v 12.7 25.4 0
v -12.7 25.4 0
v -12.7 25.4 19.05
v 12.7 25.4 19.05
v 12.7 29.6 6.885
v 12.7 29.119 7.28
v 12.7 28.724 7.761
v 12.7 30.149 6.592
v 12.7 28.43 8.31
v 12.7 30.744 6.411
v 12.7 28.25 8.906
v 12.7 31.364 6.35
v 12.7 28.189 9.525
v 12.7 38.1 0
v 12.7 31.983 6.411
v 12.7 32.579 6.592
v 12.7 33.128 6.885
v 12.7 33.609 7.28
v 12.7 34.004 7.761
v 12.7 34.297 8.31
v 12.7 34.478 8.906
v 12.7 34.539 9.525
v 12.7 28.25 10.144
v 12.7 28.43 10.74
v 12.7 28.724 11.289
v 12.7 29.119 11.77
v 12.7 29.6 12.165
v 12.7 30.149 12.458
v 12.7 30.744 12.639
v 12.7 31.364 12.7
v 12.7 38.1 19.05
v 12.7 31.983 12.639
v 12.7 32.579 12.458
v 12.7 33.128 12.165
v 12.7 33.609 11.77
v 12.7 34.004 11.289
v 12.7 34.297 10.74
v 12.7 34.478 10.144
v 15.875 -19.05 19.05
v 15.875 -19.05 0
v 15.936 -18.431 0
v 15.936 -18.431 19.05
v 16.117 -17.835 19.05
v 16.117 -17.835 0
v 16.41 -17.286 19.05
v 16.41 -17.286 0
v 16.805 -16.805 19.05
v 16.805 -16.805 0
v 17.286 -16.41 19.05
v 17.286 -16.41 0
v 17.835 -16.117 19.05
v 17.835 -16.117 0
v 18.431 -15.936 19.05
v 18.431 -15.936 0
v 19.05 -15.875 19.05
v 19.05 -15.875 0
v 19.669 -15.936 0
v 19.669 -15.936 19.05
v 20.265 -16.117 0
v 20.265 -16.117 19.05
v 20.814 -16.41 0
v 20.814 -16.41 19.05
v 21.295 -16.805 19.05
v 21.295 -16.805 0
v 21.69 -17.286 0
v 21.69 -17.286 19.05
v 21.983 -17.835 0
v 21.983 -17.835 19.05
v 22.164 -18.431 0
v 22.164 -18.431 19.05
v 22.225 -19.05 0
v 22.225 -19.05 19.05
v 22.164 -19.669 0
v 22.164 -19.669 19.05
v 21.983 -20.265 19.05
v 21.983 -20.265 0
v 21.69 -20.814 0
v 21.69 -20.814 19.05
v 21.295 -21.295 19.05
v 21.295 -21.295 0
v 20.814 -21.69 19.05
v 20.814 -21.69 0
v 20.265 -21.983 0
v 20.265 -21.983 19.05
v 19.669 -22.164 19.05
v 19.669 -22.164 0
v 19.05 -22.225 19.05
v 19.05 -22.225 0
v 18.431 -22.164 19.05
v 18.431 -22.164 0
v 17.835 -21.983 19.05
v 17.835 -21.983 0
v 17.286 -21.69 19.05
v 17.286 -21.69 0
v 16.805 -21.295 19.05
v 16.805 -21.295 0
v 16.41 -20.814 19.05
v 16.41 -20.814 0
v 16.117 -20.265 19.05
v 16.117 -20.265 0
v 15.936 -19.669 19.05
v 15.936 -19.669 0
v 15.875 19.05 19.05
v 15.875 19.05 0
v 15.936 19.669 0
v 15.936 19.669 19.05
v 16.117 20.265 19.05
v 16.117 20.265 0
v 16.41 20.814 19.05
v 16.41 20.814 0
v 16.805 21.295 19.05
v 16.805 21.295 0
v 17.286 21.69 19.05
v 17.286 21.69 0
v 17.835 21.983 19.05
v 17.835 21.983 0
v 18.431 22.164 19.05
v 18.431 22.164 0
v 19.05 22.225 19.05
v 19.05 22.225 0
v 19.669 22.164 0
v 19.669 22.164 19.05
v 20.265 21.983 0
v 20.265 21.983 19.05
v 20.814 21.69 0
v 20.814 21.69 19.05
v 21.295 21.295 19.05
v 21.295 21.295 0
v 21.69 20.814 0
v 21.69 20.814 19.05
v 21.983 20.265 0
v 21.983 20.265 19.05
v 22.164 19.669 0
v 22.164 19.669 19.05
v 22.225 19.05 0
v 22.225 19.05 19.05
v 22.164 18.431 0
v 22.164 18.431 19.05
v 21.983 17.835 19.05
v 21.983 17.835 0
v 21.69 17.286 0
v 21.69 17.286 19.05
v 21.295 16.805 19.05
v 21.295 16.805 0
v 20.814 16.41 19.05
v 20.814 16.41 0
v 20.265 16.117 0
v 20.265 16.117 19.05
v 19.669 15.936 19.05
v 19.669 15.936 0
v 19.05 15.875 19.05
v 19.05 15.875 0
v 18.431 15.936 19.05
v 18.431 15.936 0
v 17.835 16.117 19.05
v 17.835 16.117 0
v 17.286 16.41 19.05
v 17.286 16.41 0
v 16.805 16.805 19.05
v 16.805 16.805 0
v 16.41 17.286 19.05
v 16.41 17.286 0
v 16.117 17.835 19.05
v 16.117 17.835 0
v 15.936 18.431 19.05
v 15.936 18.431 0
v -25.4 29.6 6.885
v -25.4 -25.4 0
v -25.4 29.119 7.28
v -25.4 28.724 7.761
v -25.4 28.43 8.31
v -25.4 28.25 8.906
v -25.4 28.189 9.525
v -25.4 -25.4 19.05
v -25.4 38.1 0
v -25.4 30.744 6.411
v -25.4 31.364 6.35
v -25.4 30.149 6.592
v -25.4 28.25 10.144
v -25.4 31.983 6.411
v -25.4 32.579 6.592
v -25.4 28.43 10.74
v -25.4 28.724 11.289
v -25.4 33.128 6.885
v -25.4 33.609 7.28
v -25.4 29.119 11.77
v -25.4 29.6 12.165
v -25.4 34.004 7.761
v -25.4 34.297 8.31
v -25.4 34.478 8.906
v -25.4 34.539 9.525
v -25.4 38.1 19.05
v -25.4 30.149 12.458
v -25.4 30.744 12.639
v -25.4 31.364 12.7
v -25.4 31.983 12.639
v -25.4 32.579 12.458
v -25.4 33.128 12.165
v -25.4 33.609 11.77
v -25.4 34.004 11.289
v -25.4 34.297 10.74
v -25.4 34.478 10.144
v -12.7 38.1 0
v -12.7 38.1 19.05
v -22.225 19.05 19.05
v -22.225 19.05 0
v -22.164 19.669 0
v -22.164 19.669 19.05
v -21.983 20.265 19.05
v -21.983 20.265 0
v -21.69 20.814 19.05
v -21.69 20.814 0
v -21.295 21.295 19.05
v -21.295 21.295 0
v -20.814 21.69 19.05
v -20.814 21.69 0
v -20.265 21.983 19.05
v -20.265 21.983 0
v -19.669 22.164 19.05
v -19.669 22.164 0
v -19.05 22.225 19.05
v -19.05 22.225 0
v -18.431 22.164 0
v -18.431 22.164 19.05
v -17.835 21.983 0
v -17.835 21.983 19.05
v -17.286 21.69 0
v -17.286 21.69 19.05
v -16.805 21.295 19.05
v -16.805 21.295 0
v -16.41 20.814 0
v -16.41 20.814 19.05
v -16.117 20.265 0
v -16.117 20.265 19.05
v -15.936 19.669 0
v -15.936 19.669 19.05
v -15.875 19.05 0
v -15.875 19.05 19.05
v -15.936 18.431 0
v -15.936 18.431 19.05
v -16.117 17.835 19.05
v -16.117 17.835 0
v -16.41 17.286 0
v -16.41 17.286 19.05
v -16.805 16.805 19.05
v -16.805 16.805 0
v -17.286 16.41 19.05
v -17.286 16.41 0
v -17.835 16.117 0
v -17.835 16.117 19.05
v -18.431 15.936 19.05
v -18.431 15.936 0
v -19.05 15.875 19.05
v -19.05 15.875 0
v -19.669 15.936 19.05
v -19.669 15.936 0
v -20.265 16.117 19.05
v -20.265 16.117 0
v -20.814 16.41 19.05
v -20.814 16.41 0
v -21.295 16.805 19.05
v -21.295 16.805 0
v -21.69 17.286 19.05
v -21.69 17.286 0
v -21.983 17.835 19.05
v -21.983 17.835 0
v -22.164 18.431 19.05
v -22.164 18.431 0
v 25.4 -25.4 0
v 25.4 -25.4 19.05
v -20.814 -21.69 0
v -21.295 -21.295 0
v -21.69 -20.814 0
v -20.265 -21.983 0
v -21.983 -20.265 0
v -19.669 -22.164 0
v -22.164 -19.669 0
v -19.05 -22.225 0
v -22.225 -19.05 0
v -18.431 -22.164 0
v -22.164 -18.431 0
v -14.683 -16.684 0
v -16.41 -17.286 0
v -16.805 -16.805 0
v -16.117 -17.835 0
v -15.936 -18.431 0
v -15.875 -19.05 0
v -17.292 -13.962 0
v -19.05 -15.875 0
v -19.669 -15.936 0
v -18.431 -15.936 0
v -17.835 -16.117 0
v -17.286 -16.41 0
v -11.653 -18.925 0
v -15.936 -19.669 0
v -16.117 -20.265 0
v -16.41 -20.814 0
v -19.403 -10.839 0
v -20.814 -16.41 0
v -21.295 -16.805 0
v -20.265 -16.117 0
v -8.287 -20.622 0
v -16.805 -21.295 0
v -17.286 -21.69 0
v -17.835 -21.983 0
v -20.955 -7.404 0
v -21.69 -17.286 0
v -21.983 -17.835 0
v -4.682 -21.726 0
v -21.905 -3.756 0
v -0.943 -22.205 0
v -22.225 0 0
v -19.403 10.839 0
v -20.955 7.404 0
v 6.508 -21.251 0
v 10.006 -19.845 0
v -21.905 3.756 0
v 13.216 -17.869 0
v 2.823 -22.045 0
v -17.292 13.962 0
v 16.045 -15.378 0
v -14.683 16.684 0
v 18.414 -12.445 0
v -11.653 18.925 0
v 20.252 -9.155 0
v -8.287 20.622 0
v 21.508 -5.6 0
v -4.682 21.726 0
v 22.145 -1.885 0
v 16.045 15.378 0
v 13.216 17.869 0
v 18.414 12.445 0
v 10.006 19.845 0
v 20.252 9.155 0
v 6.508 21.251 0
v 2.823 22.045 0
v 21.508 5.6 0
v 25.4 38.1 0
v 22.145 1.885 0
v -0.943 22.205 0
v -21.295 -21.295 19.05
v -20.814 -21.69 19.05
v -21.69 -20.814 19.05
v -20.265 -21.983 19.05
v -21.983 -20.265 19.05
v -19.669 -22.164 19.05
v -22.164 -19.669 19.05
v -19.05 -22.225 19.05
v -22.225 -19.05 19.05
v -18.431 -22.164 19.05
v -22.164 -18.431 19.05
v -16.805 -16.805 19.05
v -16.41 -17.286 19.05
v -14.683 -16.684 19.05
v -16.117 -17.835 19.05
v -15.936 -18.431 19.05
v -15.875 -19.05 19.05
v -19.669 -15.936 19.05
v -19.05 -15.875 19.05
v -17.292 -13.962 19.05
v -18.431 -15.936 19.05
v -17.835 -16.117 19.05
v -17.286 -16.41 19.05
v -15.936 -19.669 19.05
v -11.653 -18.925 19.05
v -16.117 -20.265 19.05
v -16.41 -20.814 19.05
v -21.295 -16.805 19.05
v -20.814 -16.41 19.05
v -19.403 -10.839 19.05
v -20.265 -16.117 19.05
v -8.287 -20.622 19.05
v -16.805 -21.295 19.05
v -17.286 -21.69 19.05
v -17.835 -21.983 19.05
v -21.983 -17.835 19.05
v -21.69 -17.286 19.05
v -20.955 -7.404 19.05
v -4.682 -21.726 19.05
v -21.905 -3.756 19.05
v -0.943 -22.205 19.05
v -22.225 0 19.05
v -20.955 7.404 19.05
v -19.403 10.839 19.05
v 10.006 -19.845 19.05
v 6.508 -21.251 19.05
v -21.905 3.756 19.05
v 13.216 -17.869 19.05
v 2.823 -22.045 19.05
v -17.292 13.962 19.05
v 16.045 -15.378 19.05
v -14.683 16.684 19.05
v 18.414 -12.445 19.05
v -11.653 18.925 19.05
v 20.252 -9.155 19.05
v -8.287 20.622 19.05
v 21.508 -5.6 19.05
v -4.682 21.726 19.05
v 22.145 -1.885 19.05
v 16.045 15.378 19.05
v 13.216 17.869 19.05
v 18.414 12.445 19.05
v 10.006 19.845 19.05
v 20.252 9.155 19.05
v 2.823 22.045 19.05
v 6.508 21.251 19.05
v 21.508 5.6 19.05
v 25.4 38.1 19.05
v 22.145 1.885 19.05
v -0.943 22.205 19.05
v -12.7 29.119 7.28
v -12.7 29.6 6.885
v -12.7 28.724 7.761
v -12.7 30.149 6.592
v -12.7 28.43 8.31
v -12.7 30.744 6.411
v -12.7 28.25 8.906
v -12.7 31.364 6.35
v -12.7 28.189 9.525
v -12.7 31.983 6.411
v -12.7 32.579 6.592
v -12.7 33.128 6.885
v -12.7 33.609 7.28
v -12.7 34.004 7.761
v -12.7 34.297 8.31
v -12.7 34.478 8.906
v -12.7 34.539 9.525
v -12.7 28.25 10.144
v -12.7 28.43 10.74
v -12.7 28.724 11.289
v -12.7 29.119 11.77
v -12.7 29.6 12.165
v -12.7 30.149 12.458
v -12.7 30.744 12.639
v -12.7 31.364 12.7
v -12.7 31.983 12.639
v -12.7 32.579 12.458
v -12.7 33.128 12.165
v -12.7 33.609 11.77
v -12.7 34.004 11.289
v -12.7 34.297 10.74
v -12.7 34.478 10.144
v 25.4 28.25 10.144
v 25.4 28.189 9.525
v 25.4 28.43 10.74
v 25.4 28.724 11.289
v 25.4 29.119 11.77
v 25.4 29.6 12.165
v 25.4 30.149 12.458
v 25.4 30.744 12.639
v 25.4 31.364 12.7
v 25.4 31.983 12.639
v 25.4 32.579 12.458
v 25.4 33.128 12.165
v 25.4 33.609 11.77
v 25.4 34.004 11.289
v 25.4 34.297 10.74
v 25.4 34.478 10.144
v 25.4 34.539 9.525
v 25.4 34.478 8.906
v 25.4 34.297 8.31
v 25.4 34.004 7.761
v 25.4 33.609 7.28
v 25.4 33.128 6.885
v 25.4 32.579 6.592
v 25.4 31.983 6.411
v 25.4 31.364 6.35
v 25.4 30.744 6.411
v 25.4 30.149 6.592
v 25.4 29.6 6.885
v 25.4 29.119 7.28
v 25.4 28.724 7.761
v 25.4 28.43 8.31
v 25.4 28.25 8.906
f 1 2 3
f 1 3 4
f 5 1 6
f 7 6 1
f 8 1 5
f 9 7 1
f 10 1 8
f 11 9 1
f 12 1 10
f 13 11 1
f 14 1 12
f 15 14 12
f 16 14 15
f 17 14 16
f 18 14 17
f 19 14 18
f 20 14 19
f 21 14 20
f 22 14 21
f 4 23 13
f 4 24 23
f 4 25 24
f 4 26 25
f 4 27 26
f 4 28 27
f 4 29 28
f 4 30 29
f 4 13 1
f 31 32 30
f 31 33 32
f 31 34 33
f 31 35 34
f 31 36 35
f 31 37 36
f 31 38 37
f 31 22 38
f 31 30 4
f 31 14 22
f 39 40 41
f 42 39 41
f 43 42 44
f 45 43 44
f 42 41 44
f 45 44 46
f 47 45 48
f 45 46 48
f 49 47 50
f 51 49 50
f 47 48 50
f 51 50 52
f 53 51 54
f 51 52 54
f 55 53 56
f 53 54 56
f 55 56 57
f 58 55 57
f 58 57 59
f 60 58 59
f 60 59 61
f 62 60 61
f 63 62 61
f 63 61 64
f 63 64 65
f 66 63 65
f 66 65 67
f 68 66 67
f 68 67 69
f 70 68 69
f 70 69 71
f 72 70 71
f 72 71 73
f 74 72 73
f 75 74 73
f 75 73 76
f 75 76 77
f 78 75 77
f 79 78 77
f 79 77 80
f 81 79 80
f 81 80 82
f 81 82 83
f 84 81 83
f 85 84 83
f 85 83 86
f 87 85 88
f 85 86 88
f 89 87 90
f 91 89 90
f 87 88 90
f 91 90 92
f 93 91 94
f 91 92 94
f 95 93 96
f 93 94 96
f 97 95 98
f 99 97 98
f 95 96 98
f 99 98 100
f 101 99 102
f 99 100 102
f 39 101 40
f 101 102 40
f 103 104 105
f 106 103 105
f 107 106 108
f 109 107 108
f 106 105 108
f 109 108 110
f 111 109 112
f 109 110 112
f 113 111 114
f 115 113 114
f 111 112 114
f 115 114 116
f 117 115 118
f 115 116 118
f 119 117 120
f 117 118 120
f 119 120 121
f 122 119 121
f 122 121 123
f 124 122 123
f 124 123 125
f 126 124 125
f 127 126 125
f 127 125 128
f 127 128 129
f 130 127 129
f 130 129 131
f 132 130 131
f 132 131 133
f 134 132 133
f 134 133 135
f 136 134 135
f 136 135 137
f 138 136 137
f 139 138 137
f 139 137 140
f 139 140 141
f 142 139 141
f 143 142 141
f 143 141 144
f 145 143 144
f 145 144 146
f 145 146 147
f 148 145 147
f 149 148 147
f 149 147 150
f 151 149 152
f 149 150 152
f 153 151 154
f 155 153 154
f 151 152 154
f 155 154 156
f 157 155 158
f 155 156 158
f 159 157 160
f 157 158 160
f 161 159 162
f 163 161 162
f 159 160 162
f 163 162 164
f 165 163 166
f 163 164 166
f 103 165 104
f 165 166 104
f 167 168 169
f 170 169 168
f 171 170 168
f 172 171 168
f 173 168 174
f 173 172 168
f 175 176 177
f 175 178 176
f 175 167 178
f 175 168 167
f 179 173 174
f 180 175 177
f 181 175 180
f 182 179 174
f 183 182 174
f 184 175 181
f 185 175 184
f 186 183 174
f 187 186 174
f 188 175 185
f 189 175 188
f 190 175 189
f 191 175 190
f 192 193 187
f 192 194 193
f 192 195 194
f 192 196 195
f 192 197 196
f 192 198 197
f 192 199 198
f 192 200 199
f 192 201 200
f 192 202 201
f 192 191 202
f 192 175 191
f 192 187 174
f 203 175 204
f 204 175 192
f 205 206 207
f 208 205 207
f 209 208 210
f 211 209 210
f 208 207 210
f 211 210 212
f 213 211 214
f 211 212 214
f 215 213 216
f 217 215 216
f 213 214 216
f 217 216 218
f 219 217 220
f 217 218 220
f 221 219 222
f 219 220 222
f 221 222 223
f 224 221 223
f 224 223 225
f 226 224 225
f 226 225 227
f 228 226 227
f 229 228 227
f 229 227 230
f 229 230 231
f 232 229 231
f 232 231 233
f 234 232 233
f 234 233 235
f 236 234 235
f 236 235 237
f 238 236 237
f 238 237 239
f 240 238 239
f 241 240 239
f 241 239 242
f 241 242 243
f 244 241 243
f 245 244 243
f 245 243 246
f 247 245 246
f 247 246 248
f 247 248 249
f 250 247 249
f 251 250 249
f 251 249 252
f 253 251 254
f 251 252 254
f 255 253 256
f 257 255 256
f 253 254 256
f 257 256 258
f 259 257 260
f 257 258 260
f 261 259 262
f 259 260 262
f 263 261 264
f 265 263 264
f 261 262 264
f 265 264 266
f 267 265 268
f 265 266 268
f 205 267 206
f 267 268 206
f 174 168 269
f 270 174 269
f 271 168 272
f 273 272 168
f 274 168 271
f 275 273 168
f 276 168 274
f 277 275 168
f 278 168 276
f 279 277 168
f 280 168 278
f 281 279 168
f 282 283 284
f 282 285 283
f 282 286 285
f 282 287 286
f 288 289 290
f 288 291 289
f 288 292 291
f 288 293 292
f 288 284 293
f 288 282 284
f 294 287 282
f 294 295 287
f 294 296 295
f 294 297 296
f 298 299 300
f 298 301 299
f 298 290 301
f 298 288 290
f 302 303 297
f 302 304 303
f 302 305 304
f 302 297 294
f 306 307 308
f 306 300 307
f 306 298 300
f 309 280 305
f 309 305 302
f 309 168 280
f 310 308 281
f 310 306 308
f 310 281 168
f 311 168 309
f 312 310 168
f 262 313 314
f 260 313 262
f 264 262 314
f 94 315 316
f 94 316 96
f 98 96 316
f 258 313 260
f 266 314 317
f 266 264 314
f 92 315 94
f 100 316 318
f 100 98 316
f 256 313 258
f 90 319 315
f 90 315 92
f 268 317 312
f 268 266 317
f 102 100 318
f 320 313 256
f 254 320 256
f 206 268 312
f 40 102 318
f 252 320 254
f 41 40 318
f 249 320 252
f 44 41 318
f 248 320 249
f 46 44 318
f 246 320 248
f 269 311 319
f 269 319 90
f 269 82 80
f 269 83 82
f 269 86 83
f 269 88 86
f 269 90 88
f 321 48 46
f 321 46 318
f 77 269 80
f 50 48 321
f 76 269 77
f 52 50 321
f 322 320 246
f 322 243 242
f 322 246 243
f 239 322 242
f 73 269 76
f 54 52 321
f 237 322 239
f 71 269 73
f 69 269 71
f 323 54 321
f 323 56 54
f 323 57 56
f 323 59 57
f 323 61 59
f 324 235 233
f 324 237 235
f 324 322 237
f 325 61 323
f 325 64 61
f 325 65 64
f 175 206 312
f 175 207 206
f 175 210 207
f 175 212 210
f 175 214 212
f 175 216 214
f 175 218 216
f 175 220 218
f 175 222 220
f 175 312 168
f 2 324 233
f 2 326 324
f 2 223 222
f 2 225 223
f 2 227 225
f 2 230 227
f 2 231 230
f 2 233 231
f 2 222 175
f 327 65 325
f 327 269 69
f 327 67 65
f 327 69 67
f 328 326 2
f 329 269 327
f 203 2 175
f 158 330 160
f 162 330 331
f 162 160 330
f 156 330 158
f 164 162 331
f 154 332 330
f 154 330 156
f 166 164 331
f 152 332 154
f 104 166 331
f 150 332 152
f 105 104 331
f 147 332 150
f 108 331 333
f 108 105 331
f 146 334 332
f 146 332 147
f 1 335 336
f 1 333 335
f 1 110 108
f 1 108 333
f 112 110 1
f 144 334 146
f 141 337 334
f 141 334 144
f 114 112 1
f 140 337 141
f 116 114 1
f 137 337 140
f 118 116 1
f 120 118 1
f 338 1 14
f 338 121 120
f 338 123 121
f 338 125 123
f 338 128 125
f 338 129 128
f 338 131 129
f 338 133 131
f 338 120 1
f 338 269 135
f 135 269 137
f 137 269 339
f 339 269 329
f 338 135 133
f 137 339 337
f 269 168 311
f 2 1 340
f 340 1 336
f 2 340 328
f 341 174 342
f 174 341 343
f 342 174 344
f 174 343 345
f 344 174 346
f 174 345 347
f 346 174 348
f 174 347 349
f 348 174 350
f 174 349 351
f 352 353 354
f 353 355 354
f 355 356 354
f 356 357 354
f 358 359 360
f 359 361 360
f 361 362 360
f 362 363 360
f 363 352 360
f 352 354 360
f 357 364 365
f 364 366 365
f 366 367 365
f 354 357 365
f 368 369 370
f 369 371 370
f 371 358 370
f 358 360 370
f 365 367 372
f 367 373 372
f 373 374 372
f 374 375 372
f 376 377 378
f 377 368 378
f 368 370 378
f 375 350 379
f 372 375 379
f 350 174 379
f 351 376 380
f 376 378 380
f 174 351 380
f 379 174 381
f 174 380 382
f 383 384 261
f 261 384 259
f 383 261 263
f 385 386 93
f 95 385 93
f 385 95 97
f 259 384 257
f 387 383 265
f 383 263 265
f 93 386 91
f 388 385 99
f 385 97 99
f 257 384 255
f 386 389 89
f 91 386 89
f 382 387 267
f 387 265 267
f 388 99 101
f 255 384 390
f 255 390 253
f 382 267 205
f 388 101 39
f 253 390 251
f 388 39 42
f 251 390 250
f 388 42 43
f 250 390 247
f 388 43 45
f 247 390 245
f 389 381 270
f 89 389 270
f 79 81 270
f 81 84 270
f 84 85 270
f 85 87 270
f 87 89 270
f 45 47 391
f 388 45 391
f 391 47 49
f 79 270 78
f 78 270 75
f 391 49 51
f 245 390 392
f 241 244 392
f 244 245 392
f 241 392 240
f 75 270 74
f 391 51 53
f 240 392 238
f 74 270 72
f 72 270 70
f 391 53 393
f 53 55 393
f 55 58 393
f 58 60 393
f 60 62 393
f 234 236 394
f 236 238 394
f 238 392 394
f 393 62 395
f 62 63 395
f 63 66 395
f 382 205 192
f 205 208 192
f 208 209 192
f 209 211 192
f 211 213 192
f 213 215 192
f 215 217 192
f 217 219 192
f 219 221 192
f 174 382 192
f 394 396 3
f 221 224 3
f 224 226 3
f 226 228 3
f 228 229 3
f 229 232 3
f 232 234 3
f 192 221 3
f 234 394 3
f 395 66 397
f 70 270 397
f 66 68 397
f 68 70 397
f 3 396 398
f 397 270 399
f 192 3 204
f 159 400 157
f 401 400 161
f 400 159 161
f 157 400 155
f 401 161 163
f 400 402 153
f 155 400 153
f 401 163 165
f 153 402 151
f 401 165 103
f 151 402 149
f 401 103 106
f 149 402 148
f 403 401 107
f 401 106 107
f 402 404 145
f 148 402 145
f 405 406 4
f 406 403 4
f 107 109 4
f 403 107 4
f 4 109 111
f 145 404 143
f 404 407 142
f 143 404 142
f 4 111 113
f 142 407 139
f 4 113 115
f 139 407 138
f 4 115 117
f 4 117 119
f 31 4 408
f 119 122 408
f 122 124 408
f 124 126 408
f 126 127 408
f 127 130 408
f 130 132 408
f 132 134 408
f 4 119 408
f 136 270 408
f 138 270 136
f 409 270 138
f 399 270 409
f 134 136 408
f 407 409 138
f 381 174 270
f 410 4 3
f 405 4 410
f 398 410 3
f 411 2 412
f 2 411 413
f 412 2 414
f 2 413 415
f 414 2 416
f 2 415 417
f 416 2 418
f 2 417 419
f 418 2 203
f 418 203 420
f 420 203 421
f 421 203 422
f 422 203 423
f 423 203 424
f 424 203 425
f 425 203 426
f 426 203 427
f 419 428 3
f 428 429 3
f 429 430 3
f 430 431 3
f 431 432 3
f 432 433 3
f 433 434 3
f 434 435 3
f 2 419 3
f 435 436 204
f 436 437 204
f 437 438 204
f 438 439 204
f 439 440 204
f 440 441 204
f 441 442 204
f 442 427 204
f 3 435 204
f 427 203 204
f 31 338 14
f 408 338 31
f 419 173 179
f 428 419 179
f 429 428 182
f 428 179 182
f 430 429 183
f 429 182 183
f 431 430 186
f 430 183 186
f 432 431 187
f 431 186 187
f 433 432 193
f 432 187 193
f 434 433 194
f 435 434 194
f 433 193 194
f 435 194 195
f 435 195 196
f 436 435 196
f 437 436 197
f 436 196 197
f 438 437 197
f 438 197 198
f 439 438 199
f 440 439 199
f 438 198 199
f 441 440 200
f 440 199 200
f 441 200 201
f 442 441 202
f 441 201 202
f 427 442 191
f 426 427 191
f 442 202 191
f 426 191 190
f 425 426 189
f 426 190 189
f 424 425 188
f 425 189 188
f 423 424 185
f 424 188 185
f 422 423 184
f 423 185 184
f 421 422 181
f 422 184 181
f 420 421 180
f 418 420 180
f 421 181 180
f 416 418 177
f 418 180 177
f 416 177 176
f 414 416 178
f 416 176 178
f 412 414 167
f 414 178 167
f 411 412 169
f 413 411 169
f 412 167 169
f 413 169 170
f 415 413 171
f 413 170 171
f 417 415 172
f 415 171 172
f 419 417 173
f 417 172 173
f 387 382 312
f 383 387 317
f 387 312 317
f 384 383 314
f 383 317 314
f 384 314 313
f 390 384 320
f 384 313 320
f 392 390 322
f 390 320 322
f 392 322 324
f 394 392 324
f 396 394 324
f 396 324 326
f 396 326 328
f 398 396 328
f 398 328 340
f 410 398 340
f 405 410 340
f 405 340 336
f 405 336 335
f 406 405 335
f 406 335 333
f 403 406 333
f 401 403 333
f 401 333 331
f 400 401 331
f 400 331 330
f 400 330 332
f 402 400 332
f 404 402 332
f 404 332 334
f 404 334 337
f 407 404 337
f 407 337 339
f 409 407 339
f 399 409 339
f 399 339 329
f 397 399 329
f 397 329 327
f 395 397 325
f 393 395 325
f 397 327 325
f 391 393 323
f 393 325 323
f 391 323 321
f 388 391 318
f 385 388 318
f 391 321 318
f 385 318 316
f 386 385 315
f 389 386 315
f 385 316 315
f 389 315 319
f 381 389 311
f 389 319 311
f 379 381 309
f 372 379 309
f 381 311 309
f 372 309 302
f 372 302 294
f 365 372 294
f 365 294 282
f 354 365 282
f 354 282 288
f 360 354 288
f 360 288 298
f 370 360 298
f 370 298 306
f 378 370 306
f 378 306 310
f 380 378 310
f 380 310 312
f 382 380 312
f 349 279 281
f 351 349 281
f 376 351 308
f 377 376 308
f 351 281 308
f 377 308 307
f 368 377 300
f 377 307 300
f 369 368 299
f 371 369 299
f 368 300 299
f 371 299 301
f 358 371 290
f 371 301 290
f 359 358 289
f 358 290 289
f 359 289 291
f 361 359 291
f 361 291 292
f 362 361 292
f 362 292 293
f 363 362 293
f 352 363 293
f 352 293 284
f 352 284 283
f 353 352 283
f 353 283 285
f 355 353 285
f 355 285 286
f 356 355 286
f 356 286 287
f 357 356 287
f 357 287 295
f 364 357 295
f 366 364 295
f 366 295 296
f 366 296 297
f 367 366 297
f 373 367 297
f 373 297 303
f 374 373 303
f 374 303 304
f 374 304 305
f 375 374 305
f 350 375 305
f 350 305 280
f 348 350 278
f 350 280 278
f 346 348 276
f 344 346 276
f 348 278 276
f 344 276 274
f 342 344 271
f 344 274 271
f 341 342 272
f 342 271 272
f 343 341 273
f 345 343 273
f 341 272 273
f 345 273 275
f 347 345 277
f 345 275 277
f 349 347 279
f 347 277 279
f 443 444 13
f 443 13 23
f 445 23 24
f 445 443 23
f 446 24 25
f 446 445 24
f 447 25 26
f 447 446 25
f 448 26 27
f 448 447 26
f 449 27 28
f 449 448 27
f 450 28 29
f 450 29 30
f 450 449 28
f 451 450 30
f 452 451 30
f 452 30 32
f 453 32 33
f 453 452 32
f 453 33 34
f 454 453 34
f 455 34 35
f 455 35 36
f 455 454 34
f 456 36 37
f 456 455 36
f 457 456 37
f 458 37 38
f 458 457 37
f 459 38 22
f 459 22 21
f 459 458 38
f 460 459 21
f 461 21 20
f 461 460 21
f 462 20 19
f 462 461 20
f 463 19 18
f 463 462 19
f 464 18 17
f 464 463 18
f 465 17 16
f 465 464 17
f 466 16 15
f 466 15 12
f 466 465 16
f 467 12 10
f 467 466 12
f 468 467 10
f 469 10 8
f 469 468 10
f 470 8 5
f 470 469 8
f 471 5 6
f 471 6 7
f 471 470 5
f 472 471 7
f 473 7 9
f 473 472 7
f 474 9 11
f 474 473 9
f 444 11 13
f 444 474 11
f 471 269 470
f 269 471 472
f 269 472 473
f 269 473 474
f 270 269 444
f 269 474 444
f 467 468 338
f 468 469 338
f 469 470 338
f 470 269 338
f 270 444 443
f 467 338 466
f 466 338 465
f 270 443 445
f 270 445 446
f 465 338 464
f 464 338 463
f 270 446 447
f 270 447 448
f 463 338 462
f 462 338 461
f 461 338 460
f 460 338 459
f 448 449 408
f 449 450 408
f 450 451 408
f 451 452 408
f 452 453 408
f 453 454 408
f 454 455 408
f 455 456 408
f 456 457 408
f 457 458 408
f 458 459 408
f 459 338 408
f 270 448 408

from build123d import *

# Parameters (mm, degrees)
SKETCH1_W           = 50.8
SKETCH1_H           = 50.8
BOSS_EXTRUDE1_DEPTH = 19.05
SKETCH2_R           = 22.225
CUT_EXTRUDE1_DEPTH  = 25.4
SKETCH3_W           = 19.05
SKETCH3_H           = 12.7
SKETCH3_R           = 3.175
BOSS_EXTRUDE2_DEPTH = 12.7
SKETCH4_R           = 3.175
CUT_EXTRUDE2_DEPTH  = 50.595085442


with BuildPart() as part:
    # Sketch1 → Boss-Extrude1 (new body)
    with BuildSketch(Plane.XY):
        Rectangle(SKETCH1_W, SKETCH1_H)
    extrude(amount=BOSS_EXTRUDE1_DEPTH)

    # Sketch2 → Cut-Extrude1 (cut)
    with BuildSketch(Plane(origin=(0, 0, 0), x_dir=(-1, 0, 0), z_dir=(0, 0, -1))):
        Circle(SKETCH2_R)
    extrude(amount=-CUT_EXTRUDE1_DEPTH, mode=Mode.SUBTRACT)

    # Sketch3 → Boss-Extrude2 (add)
    with BuildSketch(Plane.ZY.offset(25.4)):
        with Locations((9.525, 31.75)):
            Rectangle(SKETCH3_W, SKETCH3_H)
        with Locations(Location((9.525, 31.363785976, 0), (0, 0, 270))):
            Circle(SKETCH3_R, mode=Mode.SUBTRACT)
    boss_extrude2 = extrude(amount=-BOSS_EXTRUDE2_DEPTH)

    # Mirror1: Boss-Extrude2 across plane
    add(boss_extrude2.mirror(Plane(origin=(0, 0, 0), x_dir=(0, 0, 1), z_dir=(1, 0, 0))))

    # Sketch4 → Cut-Extrude2 (cut, through all)
    with BuildSketch(Plane(origin=(0, 0, 0), x_dir=(-1, 0, 0), z_dir=(0, 0, -1))):
        with Locations((-19.05, 19.05)):
            Circle(SKETCH4_R)
        with Locations((19.05, 19.05)):
            Circle(SKETCH4_R)
        with Locations((19.05, -19.05)):
            Circle(SKETCH4_R)
        with Locations((-19.05, -19.05)):
            Circle(SKETCH4_R)
    extrude(amount=-CUT_EXTRUDE2_DEPTH, mode=Mode.SUBTRACT)


solid = part.part
